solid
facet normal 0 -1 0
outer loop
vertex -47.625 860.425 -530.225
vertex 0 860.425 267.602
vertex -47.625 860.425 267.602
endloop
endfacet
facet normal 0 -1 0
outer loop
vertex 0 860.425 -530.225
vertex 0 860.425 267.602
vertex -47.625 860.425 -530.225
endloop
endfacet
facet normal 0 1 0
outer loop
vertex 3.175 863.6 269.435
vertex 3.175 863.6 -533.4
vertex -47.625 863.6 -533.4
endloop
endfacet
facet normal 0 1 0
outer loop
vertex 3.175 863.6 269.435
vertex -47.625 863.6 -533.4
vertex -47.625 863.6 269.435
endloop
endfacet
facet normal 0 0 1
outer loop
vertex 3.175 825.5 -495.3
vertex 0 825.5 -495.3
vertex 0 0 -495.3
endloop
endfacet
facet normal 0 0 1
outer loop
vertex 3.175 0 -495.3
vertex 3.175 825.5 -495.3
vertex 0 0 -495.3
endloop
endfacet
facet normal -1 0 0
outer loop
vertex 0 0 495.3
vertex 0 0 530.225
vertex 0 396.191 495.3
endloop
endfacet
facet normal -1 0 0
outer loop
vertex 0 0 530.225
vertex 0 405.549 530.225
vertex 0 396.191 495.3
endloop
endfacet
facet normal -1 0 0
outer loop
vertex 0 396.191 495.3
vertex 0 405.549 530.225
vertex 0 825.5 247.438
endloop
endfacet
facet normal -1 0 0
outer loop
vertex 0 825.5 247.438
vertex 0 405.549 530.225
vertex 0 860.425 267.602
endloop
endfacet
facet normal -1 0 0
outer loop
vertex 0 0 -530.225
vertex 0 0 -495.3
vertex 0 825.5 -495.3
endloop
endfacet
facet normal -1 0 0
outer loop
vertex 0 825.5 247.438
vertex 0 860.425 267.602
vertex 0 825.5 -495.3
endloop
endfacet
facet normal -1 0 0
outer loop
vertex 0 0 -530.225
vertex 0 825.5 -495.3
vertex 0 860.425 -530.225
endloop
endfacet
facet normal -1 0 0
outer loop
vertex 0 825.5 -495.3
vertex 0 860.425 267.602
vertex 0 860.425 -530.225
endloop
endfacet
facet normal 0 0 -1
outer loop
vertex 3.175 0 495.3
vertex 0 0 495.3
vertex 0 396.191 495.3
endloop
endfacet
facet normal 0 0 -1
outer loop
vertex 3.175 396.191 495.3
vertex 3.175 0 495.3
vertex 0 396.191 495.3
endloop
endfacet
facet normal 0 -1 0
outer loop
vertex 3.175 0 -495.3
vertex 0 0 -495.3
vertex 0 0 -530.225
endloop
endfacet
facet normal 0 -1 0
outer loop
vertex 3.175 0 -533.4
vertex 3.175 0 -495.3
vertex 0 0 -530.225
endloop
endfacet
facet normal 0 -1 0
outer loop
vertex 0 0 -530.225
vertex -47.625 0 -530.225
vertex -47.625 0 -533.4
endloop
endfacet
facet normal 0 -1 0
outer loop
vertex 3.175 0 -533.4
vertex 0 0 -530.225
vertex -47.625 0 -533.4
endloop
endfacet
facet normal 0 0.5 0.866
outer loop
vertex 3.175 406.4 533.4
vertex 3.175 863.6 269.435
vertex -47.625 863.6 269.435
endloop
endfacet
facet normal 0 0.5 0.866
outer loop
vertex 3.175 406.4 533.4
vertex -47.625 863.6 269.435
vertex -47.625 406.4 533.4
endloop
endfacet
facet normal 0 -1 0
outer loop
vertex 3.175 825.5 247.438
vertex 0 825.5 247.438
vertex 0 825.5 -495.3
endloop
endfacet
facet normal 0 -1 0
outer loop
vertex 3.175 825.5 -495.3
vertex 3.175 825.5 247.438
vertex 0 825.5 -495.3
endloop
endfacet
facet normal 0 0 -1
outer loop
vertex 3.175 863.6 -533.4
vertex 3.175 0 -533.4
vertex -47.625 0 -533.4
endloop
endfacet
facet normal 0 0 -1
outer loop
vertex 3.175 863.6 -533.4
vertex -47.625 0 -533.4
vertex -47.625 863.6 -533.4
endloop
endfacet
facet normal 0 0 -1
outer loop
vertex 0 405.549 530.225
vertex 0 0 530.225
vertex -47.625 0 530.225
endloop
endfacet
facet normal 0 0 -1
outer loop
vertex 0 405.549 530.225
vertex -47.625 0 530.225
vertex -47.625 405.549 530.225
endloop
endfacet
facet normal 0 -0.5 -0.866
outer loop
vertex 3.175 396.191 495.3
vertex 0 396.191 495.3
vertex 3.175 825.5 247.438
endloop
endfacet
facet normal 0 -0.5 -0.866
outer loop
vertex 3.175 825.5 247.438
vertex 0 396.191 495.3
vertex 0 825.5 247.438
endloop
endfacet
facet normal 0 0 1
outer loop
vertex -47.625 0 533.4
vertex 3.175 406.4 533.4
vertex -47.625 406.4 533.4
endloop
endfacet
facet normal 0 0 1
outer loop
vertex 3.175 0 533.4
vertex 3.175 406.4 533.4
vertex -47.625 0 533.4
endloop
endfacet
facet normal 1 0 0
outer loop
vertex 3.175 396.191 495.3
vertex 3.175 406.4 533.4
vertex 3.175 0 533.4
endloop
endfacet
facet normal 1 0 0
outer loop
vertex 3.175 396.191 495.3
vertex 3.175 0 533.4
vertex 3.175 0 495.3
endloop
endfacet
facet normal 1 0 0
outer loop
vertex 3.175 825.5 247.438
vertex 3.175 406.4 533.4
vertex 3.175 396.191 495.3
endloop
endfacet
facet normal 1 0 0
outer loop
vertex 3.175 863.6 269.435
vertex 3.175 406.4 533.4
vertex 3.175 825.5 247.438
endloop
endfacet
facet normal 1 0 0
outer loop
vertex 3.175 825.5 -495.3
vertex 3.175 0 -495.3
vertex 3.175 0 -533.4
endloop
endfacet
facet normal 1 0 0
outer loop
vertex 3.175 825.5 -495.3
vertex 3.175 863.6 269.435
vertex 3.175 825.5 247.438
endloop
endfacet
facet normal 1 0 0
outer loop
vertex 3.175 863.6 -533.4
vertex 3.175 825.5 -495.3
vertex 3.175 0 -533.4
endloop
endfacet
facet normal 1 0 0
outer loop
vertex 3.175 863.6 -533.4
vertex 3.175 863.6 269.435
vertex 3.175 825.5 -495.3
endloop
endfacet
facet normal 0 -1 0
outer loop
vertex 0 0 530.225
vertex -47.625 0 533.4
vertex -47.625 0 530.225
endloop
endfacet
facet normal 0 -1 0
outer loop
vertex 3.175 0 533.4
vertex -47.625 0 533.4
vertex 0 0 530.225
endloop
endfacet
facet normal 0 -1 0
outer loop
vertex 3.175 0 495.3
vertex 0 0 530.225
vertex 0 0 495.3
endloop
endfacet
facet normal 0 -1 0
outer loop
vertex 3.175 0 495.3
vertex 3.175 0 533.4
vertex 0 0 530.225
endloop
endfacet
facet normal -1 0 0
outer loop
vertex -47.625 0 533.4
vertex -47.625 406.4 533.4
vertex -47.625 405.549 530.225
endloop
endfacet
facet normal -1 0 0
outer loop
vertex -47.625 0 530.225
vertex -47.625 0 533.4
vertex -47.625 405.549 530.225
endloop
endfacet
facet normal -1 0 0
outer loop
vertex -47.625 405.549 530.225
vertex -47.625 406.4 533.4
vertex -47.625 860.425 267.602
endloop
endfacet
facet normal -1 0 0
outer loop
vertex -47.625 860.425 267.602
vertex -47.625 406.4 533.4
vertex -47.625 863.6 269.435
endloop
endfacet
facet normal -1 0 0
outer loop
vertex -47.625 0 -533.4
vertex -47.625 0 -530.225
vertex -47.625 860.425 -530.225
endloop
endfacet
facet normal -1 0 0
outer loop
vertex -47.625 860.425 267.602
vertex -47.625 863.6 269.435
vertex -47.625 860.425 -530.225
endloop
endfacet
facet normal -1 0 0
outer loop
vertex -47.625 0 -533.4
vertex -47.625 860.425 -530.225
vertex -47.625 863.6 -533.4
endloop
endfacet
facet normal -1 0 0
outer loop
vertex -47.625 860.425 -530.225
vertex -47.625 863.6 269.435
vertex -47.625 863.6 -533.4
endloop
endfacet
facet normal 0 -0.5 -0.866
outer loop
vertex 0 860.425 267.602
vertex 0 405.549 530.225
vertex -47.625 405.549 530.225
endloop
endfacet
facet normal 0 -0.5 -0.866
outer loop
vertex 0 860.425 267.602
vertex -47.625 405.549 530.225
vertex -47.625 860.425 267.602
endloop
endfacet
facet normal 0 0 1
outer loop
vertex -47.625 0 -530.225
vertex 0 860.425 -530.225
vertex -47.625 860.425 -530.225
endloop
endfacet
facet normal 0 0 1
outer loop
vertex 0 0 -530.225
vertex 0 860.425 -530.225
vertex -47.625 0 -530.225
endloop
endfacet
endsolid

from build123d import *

# Parameters (mm, degrees)
BOSS_EXTRUDE1_DEPTH = 3.175
BOSS_EXTRUDE2_DEPTH = 47.625


with BuildPart() as part:
    # Sketch1 → Boss-Extrude1 (new body)
    with BuildSketch(Plane(origin=(0, 0, 0), x_dir=(0, 0, -1), z_dir=(1, 0, 0))):
        Polygon((-495.3, 0), (-495.3, 396.191135768), (-247.43841167, 825.5), (495.3, 825.5), (495.3, 0), (533.4, 0), (533.4, 863.6), (-269.435456927, 863.6), (-533.4, 406.4), (-533.4, 0), align=None)
    extrude(amount=BOSS_EXTRUDE1_DEPTH)

    # Sketch2 → Boss-Extrude2 (add)
    with BuildSketch(Plane.ZY):
        Polygon((530.225, 0), (530.225, 405.549261314), (267.602369822, 860.425), (-530.225, 860.425), (-530.225, 0), (-533.4, 0), (-533.4, 863.6), (269.435456927, 863.6), (533.4, 406.4), (533.4, 0), align=None)
    extrude(amount=BOSS_EXTRUDE2_DEPTH)


solid = part.part
